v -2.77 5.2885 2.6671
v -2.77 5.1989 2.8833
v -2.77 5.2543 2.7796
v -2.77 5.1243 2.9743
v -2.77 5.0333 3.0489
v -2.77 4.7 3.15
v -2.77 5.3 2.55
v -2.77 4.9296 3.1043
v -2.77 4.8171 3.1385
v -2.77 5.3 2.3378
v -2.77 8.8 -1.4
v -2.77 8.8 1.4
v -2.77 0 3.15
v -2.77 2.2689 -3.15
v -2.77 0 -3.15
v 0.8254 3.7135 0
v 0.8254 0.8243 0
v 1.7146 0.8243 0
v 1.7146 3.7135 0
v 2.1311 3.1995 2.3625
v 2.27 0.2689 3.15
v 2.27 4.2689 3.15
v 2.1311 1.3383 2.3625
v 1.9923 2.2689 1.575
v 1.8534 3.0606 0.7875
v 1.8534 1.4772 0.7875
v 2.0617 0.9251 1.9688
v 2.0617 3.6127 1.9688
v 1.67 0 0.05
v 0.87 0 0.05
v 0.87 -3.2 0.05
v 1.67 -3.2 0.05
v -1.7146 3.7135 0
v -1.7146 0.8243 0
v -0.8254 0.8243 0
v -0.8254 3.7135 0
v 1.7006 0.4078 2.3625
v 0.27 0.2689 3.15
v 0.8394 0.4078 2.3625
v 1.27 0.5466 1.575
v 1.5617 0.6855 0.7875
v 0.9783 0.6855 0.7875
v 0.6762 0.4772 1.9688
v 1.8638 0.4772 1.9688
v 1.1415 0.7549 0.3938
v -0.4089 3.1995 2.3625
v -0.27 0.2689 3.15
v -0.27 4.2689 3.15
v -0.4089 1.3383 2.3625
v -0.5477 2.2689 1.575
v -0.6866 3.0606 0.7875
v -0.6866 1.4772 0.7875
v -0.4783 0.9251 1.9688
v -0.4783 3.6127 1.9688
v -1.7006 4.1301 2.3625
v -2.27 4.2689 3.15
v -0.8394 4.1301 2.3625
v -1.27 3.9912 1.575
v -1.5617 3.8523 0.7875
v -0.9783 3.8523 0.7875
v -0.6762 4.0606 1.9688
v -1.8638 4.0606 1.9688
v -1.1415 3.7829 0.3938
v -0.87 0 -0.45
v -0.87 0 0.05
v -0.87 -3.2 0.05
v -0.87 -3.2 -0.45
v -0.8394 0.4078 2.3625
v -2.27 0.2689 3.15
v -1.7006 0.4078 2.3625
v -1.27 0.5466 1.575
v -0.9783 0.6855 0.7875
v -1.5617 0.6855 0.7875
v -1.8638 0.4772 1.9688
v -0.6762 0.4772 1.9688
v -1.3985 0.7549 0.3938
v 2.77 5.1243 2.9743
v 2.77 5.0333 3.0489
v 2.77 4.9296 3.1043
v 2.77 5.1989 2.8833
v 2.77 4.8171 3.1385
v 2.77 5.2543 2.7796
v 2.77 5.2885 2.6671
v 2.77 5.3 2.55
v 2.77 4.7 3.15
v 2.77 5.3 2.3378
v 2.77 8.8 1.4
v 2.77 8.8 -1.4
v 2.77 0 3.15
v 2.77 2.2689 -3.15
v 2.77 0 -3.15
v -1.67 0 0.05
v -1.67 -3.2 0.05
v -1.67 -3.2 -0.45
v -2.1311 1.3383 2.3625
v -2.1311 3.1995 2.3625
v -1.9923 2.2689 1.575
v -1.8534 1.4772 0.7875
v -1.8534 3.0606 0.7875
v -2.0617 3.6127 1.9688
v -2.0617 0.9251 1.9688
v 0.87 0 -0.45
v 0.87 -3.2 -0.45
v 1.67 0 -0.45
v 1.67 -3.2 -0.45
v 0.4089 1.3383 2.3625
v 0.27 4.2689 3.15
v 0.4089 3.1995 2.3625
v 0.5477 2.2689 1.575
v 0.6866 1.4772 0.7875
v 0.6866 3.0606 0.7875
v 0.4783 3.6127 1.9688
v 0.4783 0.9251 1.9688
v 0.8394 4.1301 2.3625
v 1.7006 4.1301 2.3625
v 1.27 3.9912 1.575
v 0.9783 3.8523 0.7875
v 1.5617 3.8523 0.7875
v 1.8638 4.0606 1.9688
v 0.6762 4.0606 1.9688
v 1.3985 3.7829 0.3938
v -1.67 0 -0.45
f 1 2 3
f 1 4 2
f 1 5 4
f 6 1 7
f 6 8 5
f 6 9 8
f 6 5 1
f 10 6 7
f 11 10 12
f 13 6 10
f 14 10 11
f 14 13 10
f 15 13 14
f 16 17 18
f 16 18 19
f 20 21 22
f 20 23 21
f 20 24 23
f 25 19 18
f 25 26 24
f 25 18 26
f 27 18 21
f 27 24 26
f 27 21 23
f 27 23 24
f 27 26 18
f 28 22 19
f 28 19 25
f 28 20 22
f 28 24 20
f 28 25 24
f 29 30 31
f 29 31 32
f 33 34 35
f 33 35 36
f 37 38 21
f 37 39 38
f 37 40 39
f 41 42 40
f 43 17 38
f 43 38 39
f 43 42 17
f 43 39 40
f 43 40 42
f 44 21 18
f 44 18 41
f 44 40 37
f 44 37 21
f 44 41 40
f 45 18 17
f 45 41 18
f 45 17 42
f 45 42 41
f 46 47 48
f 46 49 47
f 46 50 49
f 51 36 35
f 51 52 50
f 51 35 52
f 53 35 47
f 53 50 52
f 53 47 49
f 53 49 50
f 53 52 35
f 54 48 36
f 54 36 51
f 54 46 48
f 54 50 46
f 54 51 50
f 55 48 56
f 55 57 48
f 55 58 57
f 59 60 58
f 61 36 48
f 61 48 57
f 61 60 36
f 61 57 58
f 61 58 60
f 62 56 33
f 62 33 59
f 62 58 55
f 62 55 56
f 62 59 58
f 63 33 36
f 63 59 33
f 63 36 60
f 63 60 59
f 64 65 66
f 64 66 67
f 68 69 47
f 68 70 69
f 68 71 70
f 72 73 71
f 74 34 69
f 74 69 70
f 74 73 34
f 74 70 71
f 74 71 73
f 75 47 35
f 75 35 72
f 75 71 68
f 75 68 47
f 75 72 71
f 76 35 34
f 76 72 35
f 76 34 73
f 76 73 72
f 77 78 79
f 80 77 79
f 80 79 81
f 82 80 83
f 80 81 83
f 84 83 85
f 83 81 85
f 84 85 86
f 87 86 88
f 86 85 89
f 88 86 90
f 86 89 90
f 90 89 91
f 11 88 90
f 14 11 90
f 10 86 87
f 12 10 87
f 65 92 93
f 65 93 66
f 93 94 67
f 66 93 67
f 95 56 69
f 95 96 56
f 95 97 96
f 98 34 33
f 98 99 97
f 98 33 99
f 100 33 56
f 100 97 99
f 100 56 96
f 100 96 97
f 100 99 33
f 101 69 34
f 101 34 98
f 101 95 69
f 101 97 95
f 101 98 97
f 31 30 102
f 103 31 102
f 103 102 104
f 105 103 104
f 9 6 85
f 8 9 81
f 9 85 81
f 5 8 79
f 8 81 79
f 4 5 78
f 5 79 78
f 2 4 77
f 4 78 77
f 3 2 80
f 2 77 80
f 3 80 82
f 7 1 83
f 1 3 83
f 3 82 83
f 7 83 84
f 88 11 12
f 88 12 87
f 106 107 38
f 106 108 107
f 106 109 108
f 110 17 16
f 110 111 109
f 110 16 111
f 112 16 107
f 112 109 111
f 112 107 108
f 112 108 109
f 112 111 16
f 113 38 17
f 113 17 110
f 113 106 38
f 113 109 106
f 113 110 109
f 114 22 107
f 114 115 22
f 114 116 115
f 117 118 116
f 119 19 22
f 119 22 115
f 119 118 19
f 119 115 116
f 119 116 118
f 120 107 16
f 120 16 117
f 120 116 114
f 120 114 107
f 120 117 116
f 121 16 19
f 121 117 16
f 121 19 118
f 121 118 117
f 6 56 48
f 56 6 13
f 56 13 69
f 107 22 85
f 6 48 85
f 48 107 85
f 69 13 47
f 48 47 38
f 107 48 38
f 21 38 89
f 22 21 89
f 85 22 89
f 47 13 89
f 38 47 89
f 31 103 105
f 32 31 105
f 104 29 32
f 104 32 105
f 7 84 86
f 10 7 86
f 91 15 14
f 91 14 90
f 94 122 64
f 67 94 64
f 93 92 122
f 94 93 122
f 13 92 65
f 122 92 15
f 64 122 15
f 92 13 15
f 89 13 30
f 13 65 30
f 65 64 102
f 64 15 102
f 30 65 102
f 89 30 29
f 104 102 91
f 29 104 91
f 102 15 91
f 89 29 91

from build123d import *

# Parameters (mm, degrees)
SKETCH1_W           = 5.54
SKETCH1_H           = 6.3
BOSS_EXTRUDE1_DEPTH = 8.8
SKETCH2_W           = 0.8
SKETCH2_H           = 0.5
BOSS_EXTRUDE2_DEPTH = 3.2
CUT_EXTRUDE1_REACH  = 7.54
SKETCH4_W           = 2
SKETCH4_H           = 4
CUT_EXTRUDE2_DEPTH  = 3.15
CUT_EXTRUDE2_TAPER  = 10


with BuildPart() as part:
    # Sketch1 → Boss-Extrude1 (new body)
    with BuildSketch(Plane(origin=(0, 0, 0), x_dir=(1, 0, 0), z_dir=(0, 1, 0))):
        Rectangle(SKETCH1_W, SKETCH1_H)
    extrude(amount=BOSS_EXTRUDE1_DEPTH)

    # Sketch2 → Boss-Extrude2 (add)
    with BuildSketch(Plane(origin=(0, 0, 0), x_dir=(1, 0, 0), z_dir=(0, 1, 0))):
        with Locations((1.27, 0.2)):
            Rectangle(SKETCH2_W, SKETCH2_H)
        with Locations((-1.27, 0.2)):
            Rectangle(SKETCH2_W, SKETCH2_H)
    extrude(amount=-BOSS_EXTRUDE2_DEPTH)

    # Sketch3 → Cut-Extrude1 (cut, up to next)
    with BuildSketch(Plane(origin=(2.77, 0, 0), x_dir=(0, 0, -1), z_dir=(1, 0, 0)), mode=Mode.PRIVATE) as cut_extrude1_sk1:
        with BuildLine():
            ThreePointArc((-3.15, 4.7), (-2.974264069, 5.124264069), (-2.55, 5.3))
            Line((-2.55, 5.3), (-2.337822174, 5.3))
            Line((-2.337822174, 5.3), (-1.4, 8.8))
            Line((-1.4, 8.8), (-3.15, 8.8))
            Line((-3.15, 8.8), (-3.15, 4.7))
        make_face()
    cut_extrude1_tool1 = extrude(cut_extrude1_sk1.sketch, amount=-CUT_EXTRUDE1_REACH, mode=Mode.PRIVATE) & part.part
    add(cut_extrude1_tool1.solids().sort_by_distance((2.77, 7.227986, 2.489914))[0], mode=Mode.SUBTRACT)
    # Sketch3 → Cut-Extrude1 (cut, up to next)
    with BuildSketch(Plane(origin=(2.77, 0, 0), x_dir=(0, 0, -1), z_dir=(1, 0, 0)), mode=Mode.PRIVATE) as cut_extrude1_sk2:
        Polygon((3.15, 8.8), (1.4, 8.8), (3.15, 2.268911087), align=None)
    cut_extrude1_tool2 = extrude(cut_extrude1_sk2.sketch, amount=-CUT_EXTRUDE1_REACH, mode=Mode.PRIVATE) & part.part
    add(cut_extrude1_tool2.solids().sort_by_distance((2.77, 6.62297, -2.566667))[0], mode=Mode.SUBTRACT)

    # Sketch4 → Cut-Extrude2 (cut)
    with BuildSketch(Plane.XY.offset(3.15)):
        with Locations((-1.27, 2.268911087)):
            Rectangle(SKETCH4_W, SKETCH4_H)
        with Locations((1.27, 2.268911087)):
            Rectangle(SKETCH4_W, SKETCH4_H)
    extrude(amount=-CUT_EXTRUDE2_DEPTH, taper=CUT_EXTRUDE2_TAPER, mode=Mode.SUBTRACT)


solid = part.part
